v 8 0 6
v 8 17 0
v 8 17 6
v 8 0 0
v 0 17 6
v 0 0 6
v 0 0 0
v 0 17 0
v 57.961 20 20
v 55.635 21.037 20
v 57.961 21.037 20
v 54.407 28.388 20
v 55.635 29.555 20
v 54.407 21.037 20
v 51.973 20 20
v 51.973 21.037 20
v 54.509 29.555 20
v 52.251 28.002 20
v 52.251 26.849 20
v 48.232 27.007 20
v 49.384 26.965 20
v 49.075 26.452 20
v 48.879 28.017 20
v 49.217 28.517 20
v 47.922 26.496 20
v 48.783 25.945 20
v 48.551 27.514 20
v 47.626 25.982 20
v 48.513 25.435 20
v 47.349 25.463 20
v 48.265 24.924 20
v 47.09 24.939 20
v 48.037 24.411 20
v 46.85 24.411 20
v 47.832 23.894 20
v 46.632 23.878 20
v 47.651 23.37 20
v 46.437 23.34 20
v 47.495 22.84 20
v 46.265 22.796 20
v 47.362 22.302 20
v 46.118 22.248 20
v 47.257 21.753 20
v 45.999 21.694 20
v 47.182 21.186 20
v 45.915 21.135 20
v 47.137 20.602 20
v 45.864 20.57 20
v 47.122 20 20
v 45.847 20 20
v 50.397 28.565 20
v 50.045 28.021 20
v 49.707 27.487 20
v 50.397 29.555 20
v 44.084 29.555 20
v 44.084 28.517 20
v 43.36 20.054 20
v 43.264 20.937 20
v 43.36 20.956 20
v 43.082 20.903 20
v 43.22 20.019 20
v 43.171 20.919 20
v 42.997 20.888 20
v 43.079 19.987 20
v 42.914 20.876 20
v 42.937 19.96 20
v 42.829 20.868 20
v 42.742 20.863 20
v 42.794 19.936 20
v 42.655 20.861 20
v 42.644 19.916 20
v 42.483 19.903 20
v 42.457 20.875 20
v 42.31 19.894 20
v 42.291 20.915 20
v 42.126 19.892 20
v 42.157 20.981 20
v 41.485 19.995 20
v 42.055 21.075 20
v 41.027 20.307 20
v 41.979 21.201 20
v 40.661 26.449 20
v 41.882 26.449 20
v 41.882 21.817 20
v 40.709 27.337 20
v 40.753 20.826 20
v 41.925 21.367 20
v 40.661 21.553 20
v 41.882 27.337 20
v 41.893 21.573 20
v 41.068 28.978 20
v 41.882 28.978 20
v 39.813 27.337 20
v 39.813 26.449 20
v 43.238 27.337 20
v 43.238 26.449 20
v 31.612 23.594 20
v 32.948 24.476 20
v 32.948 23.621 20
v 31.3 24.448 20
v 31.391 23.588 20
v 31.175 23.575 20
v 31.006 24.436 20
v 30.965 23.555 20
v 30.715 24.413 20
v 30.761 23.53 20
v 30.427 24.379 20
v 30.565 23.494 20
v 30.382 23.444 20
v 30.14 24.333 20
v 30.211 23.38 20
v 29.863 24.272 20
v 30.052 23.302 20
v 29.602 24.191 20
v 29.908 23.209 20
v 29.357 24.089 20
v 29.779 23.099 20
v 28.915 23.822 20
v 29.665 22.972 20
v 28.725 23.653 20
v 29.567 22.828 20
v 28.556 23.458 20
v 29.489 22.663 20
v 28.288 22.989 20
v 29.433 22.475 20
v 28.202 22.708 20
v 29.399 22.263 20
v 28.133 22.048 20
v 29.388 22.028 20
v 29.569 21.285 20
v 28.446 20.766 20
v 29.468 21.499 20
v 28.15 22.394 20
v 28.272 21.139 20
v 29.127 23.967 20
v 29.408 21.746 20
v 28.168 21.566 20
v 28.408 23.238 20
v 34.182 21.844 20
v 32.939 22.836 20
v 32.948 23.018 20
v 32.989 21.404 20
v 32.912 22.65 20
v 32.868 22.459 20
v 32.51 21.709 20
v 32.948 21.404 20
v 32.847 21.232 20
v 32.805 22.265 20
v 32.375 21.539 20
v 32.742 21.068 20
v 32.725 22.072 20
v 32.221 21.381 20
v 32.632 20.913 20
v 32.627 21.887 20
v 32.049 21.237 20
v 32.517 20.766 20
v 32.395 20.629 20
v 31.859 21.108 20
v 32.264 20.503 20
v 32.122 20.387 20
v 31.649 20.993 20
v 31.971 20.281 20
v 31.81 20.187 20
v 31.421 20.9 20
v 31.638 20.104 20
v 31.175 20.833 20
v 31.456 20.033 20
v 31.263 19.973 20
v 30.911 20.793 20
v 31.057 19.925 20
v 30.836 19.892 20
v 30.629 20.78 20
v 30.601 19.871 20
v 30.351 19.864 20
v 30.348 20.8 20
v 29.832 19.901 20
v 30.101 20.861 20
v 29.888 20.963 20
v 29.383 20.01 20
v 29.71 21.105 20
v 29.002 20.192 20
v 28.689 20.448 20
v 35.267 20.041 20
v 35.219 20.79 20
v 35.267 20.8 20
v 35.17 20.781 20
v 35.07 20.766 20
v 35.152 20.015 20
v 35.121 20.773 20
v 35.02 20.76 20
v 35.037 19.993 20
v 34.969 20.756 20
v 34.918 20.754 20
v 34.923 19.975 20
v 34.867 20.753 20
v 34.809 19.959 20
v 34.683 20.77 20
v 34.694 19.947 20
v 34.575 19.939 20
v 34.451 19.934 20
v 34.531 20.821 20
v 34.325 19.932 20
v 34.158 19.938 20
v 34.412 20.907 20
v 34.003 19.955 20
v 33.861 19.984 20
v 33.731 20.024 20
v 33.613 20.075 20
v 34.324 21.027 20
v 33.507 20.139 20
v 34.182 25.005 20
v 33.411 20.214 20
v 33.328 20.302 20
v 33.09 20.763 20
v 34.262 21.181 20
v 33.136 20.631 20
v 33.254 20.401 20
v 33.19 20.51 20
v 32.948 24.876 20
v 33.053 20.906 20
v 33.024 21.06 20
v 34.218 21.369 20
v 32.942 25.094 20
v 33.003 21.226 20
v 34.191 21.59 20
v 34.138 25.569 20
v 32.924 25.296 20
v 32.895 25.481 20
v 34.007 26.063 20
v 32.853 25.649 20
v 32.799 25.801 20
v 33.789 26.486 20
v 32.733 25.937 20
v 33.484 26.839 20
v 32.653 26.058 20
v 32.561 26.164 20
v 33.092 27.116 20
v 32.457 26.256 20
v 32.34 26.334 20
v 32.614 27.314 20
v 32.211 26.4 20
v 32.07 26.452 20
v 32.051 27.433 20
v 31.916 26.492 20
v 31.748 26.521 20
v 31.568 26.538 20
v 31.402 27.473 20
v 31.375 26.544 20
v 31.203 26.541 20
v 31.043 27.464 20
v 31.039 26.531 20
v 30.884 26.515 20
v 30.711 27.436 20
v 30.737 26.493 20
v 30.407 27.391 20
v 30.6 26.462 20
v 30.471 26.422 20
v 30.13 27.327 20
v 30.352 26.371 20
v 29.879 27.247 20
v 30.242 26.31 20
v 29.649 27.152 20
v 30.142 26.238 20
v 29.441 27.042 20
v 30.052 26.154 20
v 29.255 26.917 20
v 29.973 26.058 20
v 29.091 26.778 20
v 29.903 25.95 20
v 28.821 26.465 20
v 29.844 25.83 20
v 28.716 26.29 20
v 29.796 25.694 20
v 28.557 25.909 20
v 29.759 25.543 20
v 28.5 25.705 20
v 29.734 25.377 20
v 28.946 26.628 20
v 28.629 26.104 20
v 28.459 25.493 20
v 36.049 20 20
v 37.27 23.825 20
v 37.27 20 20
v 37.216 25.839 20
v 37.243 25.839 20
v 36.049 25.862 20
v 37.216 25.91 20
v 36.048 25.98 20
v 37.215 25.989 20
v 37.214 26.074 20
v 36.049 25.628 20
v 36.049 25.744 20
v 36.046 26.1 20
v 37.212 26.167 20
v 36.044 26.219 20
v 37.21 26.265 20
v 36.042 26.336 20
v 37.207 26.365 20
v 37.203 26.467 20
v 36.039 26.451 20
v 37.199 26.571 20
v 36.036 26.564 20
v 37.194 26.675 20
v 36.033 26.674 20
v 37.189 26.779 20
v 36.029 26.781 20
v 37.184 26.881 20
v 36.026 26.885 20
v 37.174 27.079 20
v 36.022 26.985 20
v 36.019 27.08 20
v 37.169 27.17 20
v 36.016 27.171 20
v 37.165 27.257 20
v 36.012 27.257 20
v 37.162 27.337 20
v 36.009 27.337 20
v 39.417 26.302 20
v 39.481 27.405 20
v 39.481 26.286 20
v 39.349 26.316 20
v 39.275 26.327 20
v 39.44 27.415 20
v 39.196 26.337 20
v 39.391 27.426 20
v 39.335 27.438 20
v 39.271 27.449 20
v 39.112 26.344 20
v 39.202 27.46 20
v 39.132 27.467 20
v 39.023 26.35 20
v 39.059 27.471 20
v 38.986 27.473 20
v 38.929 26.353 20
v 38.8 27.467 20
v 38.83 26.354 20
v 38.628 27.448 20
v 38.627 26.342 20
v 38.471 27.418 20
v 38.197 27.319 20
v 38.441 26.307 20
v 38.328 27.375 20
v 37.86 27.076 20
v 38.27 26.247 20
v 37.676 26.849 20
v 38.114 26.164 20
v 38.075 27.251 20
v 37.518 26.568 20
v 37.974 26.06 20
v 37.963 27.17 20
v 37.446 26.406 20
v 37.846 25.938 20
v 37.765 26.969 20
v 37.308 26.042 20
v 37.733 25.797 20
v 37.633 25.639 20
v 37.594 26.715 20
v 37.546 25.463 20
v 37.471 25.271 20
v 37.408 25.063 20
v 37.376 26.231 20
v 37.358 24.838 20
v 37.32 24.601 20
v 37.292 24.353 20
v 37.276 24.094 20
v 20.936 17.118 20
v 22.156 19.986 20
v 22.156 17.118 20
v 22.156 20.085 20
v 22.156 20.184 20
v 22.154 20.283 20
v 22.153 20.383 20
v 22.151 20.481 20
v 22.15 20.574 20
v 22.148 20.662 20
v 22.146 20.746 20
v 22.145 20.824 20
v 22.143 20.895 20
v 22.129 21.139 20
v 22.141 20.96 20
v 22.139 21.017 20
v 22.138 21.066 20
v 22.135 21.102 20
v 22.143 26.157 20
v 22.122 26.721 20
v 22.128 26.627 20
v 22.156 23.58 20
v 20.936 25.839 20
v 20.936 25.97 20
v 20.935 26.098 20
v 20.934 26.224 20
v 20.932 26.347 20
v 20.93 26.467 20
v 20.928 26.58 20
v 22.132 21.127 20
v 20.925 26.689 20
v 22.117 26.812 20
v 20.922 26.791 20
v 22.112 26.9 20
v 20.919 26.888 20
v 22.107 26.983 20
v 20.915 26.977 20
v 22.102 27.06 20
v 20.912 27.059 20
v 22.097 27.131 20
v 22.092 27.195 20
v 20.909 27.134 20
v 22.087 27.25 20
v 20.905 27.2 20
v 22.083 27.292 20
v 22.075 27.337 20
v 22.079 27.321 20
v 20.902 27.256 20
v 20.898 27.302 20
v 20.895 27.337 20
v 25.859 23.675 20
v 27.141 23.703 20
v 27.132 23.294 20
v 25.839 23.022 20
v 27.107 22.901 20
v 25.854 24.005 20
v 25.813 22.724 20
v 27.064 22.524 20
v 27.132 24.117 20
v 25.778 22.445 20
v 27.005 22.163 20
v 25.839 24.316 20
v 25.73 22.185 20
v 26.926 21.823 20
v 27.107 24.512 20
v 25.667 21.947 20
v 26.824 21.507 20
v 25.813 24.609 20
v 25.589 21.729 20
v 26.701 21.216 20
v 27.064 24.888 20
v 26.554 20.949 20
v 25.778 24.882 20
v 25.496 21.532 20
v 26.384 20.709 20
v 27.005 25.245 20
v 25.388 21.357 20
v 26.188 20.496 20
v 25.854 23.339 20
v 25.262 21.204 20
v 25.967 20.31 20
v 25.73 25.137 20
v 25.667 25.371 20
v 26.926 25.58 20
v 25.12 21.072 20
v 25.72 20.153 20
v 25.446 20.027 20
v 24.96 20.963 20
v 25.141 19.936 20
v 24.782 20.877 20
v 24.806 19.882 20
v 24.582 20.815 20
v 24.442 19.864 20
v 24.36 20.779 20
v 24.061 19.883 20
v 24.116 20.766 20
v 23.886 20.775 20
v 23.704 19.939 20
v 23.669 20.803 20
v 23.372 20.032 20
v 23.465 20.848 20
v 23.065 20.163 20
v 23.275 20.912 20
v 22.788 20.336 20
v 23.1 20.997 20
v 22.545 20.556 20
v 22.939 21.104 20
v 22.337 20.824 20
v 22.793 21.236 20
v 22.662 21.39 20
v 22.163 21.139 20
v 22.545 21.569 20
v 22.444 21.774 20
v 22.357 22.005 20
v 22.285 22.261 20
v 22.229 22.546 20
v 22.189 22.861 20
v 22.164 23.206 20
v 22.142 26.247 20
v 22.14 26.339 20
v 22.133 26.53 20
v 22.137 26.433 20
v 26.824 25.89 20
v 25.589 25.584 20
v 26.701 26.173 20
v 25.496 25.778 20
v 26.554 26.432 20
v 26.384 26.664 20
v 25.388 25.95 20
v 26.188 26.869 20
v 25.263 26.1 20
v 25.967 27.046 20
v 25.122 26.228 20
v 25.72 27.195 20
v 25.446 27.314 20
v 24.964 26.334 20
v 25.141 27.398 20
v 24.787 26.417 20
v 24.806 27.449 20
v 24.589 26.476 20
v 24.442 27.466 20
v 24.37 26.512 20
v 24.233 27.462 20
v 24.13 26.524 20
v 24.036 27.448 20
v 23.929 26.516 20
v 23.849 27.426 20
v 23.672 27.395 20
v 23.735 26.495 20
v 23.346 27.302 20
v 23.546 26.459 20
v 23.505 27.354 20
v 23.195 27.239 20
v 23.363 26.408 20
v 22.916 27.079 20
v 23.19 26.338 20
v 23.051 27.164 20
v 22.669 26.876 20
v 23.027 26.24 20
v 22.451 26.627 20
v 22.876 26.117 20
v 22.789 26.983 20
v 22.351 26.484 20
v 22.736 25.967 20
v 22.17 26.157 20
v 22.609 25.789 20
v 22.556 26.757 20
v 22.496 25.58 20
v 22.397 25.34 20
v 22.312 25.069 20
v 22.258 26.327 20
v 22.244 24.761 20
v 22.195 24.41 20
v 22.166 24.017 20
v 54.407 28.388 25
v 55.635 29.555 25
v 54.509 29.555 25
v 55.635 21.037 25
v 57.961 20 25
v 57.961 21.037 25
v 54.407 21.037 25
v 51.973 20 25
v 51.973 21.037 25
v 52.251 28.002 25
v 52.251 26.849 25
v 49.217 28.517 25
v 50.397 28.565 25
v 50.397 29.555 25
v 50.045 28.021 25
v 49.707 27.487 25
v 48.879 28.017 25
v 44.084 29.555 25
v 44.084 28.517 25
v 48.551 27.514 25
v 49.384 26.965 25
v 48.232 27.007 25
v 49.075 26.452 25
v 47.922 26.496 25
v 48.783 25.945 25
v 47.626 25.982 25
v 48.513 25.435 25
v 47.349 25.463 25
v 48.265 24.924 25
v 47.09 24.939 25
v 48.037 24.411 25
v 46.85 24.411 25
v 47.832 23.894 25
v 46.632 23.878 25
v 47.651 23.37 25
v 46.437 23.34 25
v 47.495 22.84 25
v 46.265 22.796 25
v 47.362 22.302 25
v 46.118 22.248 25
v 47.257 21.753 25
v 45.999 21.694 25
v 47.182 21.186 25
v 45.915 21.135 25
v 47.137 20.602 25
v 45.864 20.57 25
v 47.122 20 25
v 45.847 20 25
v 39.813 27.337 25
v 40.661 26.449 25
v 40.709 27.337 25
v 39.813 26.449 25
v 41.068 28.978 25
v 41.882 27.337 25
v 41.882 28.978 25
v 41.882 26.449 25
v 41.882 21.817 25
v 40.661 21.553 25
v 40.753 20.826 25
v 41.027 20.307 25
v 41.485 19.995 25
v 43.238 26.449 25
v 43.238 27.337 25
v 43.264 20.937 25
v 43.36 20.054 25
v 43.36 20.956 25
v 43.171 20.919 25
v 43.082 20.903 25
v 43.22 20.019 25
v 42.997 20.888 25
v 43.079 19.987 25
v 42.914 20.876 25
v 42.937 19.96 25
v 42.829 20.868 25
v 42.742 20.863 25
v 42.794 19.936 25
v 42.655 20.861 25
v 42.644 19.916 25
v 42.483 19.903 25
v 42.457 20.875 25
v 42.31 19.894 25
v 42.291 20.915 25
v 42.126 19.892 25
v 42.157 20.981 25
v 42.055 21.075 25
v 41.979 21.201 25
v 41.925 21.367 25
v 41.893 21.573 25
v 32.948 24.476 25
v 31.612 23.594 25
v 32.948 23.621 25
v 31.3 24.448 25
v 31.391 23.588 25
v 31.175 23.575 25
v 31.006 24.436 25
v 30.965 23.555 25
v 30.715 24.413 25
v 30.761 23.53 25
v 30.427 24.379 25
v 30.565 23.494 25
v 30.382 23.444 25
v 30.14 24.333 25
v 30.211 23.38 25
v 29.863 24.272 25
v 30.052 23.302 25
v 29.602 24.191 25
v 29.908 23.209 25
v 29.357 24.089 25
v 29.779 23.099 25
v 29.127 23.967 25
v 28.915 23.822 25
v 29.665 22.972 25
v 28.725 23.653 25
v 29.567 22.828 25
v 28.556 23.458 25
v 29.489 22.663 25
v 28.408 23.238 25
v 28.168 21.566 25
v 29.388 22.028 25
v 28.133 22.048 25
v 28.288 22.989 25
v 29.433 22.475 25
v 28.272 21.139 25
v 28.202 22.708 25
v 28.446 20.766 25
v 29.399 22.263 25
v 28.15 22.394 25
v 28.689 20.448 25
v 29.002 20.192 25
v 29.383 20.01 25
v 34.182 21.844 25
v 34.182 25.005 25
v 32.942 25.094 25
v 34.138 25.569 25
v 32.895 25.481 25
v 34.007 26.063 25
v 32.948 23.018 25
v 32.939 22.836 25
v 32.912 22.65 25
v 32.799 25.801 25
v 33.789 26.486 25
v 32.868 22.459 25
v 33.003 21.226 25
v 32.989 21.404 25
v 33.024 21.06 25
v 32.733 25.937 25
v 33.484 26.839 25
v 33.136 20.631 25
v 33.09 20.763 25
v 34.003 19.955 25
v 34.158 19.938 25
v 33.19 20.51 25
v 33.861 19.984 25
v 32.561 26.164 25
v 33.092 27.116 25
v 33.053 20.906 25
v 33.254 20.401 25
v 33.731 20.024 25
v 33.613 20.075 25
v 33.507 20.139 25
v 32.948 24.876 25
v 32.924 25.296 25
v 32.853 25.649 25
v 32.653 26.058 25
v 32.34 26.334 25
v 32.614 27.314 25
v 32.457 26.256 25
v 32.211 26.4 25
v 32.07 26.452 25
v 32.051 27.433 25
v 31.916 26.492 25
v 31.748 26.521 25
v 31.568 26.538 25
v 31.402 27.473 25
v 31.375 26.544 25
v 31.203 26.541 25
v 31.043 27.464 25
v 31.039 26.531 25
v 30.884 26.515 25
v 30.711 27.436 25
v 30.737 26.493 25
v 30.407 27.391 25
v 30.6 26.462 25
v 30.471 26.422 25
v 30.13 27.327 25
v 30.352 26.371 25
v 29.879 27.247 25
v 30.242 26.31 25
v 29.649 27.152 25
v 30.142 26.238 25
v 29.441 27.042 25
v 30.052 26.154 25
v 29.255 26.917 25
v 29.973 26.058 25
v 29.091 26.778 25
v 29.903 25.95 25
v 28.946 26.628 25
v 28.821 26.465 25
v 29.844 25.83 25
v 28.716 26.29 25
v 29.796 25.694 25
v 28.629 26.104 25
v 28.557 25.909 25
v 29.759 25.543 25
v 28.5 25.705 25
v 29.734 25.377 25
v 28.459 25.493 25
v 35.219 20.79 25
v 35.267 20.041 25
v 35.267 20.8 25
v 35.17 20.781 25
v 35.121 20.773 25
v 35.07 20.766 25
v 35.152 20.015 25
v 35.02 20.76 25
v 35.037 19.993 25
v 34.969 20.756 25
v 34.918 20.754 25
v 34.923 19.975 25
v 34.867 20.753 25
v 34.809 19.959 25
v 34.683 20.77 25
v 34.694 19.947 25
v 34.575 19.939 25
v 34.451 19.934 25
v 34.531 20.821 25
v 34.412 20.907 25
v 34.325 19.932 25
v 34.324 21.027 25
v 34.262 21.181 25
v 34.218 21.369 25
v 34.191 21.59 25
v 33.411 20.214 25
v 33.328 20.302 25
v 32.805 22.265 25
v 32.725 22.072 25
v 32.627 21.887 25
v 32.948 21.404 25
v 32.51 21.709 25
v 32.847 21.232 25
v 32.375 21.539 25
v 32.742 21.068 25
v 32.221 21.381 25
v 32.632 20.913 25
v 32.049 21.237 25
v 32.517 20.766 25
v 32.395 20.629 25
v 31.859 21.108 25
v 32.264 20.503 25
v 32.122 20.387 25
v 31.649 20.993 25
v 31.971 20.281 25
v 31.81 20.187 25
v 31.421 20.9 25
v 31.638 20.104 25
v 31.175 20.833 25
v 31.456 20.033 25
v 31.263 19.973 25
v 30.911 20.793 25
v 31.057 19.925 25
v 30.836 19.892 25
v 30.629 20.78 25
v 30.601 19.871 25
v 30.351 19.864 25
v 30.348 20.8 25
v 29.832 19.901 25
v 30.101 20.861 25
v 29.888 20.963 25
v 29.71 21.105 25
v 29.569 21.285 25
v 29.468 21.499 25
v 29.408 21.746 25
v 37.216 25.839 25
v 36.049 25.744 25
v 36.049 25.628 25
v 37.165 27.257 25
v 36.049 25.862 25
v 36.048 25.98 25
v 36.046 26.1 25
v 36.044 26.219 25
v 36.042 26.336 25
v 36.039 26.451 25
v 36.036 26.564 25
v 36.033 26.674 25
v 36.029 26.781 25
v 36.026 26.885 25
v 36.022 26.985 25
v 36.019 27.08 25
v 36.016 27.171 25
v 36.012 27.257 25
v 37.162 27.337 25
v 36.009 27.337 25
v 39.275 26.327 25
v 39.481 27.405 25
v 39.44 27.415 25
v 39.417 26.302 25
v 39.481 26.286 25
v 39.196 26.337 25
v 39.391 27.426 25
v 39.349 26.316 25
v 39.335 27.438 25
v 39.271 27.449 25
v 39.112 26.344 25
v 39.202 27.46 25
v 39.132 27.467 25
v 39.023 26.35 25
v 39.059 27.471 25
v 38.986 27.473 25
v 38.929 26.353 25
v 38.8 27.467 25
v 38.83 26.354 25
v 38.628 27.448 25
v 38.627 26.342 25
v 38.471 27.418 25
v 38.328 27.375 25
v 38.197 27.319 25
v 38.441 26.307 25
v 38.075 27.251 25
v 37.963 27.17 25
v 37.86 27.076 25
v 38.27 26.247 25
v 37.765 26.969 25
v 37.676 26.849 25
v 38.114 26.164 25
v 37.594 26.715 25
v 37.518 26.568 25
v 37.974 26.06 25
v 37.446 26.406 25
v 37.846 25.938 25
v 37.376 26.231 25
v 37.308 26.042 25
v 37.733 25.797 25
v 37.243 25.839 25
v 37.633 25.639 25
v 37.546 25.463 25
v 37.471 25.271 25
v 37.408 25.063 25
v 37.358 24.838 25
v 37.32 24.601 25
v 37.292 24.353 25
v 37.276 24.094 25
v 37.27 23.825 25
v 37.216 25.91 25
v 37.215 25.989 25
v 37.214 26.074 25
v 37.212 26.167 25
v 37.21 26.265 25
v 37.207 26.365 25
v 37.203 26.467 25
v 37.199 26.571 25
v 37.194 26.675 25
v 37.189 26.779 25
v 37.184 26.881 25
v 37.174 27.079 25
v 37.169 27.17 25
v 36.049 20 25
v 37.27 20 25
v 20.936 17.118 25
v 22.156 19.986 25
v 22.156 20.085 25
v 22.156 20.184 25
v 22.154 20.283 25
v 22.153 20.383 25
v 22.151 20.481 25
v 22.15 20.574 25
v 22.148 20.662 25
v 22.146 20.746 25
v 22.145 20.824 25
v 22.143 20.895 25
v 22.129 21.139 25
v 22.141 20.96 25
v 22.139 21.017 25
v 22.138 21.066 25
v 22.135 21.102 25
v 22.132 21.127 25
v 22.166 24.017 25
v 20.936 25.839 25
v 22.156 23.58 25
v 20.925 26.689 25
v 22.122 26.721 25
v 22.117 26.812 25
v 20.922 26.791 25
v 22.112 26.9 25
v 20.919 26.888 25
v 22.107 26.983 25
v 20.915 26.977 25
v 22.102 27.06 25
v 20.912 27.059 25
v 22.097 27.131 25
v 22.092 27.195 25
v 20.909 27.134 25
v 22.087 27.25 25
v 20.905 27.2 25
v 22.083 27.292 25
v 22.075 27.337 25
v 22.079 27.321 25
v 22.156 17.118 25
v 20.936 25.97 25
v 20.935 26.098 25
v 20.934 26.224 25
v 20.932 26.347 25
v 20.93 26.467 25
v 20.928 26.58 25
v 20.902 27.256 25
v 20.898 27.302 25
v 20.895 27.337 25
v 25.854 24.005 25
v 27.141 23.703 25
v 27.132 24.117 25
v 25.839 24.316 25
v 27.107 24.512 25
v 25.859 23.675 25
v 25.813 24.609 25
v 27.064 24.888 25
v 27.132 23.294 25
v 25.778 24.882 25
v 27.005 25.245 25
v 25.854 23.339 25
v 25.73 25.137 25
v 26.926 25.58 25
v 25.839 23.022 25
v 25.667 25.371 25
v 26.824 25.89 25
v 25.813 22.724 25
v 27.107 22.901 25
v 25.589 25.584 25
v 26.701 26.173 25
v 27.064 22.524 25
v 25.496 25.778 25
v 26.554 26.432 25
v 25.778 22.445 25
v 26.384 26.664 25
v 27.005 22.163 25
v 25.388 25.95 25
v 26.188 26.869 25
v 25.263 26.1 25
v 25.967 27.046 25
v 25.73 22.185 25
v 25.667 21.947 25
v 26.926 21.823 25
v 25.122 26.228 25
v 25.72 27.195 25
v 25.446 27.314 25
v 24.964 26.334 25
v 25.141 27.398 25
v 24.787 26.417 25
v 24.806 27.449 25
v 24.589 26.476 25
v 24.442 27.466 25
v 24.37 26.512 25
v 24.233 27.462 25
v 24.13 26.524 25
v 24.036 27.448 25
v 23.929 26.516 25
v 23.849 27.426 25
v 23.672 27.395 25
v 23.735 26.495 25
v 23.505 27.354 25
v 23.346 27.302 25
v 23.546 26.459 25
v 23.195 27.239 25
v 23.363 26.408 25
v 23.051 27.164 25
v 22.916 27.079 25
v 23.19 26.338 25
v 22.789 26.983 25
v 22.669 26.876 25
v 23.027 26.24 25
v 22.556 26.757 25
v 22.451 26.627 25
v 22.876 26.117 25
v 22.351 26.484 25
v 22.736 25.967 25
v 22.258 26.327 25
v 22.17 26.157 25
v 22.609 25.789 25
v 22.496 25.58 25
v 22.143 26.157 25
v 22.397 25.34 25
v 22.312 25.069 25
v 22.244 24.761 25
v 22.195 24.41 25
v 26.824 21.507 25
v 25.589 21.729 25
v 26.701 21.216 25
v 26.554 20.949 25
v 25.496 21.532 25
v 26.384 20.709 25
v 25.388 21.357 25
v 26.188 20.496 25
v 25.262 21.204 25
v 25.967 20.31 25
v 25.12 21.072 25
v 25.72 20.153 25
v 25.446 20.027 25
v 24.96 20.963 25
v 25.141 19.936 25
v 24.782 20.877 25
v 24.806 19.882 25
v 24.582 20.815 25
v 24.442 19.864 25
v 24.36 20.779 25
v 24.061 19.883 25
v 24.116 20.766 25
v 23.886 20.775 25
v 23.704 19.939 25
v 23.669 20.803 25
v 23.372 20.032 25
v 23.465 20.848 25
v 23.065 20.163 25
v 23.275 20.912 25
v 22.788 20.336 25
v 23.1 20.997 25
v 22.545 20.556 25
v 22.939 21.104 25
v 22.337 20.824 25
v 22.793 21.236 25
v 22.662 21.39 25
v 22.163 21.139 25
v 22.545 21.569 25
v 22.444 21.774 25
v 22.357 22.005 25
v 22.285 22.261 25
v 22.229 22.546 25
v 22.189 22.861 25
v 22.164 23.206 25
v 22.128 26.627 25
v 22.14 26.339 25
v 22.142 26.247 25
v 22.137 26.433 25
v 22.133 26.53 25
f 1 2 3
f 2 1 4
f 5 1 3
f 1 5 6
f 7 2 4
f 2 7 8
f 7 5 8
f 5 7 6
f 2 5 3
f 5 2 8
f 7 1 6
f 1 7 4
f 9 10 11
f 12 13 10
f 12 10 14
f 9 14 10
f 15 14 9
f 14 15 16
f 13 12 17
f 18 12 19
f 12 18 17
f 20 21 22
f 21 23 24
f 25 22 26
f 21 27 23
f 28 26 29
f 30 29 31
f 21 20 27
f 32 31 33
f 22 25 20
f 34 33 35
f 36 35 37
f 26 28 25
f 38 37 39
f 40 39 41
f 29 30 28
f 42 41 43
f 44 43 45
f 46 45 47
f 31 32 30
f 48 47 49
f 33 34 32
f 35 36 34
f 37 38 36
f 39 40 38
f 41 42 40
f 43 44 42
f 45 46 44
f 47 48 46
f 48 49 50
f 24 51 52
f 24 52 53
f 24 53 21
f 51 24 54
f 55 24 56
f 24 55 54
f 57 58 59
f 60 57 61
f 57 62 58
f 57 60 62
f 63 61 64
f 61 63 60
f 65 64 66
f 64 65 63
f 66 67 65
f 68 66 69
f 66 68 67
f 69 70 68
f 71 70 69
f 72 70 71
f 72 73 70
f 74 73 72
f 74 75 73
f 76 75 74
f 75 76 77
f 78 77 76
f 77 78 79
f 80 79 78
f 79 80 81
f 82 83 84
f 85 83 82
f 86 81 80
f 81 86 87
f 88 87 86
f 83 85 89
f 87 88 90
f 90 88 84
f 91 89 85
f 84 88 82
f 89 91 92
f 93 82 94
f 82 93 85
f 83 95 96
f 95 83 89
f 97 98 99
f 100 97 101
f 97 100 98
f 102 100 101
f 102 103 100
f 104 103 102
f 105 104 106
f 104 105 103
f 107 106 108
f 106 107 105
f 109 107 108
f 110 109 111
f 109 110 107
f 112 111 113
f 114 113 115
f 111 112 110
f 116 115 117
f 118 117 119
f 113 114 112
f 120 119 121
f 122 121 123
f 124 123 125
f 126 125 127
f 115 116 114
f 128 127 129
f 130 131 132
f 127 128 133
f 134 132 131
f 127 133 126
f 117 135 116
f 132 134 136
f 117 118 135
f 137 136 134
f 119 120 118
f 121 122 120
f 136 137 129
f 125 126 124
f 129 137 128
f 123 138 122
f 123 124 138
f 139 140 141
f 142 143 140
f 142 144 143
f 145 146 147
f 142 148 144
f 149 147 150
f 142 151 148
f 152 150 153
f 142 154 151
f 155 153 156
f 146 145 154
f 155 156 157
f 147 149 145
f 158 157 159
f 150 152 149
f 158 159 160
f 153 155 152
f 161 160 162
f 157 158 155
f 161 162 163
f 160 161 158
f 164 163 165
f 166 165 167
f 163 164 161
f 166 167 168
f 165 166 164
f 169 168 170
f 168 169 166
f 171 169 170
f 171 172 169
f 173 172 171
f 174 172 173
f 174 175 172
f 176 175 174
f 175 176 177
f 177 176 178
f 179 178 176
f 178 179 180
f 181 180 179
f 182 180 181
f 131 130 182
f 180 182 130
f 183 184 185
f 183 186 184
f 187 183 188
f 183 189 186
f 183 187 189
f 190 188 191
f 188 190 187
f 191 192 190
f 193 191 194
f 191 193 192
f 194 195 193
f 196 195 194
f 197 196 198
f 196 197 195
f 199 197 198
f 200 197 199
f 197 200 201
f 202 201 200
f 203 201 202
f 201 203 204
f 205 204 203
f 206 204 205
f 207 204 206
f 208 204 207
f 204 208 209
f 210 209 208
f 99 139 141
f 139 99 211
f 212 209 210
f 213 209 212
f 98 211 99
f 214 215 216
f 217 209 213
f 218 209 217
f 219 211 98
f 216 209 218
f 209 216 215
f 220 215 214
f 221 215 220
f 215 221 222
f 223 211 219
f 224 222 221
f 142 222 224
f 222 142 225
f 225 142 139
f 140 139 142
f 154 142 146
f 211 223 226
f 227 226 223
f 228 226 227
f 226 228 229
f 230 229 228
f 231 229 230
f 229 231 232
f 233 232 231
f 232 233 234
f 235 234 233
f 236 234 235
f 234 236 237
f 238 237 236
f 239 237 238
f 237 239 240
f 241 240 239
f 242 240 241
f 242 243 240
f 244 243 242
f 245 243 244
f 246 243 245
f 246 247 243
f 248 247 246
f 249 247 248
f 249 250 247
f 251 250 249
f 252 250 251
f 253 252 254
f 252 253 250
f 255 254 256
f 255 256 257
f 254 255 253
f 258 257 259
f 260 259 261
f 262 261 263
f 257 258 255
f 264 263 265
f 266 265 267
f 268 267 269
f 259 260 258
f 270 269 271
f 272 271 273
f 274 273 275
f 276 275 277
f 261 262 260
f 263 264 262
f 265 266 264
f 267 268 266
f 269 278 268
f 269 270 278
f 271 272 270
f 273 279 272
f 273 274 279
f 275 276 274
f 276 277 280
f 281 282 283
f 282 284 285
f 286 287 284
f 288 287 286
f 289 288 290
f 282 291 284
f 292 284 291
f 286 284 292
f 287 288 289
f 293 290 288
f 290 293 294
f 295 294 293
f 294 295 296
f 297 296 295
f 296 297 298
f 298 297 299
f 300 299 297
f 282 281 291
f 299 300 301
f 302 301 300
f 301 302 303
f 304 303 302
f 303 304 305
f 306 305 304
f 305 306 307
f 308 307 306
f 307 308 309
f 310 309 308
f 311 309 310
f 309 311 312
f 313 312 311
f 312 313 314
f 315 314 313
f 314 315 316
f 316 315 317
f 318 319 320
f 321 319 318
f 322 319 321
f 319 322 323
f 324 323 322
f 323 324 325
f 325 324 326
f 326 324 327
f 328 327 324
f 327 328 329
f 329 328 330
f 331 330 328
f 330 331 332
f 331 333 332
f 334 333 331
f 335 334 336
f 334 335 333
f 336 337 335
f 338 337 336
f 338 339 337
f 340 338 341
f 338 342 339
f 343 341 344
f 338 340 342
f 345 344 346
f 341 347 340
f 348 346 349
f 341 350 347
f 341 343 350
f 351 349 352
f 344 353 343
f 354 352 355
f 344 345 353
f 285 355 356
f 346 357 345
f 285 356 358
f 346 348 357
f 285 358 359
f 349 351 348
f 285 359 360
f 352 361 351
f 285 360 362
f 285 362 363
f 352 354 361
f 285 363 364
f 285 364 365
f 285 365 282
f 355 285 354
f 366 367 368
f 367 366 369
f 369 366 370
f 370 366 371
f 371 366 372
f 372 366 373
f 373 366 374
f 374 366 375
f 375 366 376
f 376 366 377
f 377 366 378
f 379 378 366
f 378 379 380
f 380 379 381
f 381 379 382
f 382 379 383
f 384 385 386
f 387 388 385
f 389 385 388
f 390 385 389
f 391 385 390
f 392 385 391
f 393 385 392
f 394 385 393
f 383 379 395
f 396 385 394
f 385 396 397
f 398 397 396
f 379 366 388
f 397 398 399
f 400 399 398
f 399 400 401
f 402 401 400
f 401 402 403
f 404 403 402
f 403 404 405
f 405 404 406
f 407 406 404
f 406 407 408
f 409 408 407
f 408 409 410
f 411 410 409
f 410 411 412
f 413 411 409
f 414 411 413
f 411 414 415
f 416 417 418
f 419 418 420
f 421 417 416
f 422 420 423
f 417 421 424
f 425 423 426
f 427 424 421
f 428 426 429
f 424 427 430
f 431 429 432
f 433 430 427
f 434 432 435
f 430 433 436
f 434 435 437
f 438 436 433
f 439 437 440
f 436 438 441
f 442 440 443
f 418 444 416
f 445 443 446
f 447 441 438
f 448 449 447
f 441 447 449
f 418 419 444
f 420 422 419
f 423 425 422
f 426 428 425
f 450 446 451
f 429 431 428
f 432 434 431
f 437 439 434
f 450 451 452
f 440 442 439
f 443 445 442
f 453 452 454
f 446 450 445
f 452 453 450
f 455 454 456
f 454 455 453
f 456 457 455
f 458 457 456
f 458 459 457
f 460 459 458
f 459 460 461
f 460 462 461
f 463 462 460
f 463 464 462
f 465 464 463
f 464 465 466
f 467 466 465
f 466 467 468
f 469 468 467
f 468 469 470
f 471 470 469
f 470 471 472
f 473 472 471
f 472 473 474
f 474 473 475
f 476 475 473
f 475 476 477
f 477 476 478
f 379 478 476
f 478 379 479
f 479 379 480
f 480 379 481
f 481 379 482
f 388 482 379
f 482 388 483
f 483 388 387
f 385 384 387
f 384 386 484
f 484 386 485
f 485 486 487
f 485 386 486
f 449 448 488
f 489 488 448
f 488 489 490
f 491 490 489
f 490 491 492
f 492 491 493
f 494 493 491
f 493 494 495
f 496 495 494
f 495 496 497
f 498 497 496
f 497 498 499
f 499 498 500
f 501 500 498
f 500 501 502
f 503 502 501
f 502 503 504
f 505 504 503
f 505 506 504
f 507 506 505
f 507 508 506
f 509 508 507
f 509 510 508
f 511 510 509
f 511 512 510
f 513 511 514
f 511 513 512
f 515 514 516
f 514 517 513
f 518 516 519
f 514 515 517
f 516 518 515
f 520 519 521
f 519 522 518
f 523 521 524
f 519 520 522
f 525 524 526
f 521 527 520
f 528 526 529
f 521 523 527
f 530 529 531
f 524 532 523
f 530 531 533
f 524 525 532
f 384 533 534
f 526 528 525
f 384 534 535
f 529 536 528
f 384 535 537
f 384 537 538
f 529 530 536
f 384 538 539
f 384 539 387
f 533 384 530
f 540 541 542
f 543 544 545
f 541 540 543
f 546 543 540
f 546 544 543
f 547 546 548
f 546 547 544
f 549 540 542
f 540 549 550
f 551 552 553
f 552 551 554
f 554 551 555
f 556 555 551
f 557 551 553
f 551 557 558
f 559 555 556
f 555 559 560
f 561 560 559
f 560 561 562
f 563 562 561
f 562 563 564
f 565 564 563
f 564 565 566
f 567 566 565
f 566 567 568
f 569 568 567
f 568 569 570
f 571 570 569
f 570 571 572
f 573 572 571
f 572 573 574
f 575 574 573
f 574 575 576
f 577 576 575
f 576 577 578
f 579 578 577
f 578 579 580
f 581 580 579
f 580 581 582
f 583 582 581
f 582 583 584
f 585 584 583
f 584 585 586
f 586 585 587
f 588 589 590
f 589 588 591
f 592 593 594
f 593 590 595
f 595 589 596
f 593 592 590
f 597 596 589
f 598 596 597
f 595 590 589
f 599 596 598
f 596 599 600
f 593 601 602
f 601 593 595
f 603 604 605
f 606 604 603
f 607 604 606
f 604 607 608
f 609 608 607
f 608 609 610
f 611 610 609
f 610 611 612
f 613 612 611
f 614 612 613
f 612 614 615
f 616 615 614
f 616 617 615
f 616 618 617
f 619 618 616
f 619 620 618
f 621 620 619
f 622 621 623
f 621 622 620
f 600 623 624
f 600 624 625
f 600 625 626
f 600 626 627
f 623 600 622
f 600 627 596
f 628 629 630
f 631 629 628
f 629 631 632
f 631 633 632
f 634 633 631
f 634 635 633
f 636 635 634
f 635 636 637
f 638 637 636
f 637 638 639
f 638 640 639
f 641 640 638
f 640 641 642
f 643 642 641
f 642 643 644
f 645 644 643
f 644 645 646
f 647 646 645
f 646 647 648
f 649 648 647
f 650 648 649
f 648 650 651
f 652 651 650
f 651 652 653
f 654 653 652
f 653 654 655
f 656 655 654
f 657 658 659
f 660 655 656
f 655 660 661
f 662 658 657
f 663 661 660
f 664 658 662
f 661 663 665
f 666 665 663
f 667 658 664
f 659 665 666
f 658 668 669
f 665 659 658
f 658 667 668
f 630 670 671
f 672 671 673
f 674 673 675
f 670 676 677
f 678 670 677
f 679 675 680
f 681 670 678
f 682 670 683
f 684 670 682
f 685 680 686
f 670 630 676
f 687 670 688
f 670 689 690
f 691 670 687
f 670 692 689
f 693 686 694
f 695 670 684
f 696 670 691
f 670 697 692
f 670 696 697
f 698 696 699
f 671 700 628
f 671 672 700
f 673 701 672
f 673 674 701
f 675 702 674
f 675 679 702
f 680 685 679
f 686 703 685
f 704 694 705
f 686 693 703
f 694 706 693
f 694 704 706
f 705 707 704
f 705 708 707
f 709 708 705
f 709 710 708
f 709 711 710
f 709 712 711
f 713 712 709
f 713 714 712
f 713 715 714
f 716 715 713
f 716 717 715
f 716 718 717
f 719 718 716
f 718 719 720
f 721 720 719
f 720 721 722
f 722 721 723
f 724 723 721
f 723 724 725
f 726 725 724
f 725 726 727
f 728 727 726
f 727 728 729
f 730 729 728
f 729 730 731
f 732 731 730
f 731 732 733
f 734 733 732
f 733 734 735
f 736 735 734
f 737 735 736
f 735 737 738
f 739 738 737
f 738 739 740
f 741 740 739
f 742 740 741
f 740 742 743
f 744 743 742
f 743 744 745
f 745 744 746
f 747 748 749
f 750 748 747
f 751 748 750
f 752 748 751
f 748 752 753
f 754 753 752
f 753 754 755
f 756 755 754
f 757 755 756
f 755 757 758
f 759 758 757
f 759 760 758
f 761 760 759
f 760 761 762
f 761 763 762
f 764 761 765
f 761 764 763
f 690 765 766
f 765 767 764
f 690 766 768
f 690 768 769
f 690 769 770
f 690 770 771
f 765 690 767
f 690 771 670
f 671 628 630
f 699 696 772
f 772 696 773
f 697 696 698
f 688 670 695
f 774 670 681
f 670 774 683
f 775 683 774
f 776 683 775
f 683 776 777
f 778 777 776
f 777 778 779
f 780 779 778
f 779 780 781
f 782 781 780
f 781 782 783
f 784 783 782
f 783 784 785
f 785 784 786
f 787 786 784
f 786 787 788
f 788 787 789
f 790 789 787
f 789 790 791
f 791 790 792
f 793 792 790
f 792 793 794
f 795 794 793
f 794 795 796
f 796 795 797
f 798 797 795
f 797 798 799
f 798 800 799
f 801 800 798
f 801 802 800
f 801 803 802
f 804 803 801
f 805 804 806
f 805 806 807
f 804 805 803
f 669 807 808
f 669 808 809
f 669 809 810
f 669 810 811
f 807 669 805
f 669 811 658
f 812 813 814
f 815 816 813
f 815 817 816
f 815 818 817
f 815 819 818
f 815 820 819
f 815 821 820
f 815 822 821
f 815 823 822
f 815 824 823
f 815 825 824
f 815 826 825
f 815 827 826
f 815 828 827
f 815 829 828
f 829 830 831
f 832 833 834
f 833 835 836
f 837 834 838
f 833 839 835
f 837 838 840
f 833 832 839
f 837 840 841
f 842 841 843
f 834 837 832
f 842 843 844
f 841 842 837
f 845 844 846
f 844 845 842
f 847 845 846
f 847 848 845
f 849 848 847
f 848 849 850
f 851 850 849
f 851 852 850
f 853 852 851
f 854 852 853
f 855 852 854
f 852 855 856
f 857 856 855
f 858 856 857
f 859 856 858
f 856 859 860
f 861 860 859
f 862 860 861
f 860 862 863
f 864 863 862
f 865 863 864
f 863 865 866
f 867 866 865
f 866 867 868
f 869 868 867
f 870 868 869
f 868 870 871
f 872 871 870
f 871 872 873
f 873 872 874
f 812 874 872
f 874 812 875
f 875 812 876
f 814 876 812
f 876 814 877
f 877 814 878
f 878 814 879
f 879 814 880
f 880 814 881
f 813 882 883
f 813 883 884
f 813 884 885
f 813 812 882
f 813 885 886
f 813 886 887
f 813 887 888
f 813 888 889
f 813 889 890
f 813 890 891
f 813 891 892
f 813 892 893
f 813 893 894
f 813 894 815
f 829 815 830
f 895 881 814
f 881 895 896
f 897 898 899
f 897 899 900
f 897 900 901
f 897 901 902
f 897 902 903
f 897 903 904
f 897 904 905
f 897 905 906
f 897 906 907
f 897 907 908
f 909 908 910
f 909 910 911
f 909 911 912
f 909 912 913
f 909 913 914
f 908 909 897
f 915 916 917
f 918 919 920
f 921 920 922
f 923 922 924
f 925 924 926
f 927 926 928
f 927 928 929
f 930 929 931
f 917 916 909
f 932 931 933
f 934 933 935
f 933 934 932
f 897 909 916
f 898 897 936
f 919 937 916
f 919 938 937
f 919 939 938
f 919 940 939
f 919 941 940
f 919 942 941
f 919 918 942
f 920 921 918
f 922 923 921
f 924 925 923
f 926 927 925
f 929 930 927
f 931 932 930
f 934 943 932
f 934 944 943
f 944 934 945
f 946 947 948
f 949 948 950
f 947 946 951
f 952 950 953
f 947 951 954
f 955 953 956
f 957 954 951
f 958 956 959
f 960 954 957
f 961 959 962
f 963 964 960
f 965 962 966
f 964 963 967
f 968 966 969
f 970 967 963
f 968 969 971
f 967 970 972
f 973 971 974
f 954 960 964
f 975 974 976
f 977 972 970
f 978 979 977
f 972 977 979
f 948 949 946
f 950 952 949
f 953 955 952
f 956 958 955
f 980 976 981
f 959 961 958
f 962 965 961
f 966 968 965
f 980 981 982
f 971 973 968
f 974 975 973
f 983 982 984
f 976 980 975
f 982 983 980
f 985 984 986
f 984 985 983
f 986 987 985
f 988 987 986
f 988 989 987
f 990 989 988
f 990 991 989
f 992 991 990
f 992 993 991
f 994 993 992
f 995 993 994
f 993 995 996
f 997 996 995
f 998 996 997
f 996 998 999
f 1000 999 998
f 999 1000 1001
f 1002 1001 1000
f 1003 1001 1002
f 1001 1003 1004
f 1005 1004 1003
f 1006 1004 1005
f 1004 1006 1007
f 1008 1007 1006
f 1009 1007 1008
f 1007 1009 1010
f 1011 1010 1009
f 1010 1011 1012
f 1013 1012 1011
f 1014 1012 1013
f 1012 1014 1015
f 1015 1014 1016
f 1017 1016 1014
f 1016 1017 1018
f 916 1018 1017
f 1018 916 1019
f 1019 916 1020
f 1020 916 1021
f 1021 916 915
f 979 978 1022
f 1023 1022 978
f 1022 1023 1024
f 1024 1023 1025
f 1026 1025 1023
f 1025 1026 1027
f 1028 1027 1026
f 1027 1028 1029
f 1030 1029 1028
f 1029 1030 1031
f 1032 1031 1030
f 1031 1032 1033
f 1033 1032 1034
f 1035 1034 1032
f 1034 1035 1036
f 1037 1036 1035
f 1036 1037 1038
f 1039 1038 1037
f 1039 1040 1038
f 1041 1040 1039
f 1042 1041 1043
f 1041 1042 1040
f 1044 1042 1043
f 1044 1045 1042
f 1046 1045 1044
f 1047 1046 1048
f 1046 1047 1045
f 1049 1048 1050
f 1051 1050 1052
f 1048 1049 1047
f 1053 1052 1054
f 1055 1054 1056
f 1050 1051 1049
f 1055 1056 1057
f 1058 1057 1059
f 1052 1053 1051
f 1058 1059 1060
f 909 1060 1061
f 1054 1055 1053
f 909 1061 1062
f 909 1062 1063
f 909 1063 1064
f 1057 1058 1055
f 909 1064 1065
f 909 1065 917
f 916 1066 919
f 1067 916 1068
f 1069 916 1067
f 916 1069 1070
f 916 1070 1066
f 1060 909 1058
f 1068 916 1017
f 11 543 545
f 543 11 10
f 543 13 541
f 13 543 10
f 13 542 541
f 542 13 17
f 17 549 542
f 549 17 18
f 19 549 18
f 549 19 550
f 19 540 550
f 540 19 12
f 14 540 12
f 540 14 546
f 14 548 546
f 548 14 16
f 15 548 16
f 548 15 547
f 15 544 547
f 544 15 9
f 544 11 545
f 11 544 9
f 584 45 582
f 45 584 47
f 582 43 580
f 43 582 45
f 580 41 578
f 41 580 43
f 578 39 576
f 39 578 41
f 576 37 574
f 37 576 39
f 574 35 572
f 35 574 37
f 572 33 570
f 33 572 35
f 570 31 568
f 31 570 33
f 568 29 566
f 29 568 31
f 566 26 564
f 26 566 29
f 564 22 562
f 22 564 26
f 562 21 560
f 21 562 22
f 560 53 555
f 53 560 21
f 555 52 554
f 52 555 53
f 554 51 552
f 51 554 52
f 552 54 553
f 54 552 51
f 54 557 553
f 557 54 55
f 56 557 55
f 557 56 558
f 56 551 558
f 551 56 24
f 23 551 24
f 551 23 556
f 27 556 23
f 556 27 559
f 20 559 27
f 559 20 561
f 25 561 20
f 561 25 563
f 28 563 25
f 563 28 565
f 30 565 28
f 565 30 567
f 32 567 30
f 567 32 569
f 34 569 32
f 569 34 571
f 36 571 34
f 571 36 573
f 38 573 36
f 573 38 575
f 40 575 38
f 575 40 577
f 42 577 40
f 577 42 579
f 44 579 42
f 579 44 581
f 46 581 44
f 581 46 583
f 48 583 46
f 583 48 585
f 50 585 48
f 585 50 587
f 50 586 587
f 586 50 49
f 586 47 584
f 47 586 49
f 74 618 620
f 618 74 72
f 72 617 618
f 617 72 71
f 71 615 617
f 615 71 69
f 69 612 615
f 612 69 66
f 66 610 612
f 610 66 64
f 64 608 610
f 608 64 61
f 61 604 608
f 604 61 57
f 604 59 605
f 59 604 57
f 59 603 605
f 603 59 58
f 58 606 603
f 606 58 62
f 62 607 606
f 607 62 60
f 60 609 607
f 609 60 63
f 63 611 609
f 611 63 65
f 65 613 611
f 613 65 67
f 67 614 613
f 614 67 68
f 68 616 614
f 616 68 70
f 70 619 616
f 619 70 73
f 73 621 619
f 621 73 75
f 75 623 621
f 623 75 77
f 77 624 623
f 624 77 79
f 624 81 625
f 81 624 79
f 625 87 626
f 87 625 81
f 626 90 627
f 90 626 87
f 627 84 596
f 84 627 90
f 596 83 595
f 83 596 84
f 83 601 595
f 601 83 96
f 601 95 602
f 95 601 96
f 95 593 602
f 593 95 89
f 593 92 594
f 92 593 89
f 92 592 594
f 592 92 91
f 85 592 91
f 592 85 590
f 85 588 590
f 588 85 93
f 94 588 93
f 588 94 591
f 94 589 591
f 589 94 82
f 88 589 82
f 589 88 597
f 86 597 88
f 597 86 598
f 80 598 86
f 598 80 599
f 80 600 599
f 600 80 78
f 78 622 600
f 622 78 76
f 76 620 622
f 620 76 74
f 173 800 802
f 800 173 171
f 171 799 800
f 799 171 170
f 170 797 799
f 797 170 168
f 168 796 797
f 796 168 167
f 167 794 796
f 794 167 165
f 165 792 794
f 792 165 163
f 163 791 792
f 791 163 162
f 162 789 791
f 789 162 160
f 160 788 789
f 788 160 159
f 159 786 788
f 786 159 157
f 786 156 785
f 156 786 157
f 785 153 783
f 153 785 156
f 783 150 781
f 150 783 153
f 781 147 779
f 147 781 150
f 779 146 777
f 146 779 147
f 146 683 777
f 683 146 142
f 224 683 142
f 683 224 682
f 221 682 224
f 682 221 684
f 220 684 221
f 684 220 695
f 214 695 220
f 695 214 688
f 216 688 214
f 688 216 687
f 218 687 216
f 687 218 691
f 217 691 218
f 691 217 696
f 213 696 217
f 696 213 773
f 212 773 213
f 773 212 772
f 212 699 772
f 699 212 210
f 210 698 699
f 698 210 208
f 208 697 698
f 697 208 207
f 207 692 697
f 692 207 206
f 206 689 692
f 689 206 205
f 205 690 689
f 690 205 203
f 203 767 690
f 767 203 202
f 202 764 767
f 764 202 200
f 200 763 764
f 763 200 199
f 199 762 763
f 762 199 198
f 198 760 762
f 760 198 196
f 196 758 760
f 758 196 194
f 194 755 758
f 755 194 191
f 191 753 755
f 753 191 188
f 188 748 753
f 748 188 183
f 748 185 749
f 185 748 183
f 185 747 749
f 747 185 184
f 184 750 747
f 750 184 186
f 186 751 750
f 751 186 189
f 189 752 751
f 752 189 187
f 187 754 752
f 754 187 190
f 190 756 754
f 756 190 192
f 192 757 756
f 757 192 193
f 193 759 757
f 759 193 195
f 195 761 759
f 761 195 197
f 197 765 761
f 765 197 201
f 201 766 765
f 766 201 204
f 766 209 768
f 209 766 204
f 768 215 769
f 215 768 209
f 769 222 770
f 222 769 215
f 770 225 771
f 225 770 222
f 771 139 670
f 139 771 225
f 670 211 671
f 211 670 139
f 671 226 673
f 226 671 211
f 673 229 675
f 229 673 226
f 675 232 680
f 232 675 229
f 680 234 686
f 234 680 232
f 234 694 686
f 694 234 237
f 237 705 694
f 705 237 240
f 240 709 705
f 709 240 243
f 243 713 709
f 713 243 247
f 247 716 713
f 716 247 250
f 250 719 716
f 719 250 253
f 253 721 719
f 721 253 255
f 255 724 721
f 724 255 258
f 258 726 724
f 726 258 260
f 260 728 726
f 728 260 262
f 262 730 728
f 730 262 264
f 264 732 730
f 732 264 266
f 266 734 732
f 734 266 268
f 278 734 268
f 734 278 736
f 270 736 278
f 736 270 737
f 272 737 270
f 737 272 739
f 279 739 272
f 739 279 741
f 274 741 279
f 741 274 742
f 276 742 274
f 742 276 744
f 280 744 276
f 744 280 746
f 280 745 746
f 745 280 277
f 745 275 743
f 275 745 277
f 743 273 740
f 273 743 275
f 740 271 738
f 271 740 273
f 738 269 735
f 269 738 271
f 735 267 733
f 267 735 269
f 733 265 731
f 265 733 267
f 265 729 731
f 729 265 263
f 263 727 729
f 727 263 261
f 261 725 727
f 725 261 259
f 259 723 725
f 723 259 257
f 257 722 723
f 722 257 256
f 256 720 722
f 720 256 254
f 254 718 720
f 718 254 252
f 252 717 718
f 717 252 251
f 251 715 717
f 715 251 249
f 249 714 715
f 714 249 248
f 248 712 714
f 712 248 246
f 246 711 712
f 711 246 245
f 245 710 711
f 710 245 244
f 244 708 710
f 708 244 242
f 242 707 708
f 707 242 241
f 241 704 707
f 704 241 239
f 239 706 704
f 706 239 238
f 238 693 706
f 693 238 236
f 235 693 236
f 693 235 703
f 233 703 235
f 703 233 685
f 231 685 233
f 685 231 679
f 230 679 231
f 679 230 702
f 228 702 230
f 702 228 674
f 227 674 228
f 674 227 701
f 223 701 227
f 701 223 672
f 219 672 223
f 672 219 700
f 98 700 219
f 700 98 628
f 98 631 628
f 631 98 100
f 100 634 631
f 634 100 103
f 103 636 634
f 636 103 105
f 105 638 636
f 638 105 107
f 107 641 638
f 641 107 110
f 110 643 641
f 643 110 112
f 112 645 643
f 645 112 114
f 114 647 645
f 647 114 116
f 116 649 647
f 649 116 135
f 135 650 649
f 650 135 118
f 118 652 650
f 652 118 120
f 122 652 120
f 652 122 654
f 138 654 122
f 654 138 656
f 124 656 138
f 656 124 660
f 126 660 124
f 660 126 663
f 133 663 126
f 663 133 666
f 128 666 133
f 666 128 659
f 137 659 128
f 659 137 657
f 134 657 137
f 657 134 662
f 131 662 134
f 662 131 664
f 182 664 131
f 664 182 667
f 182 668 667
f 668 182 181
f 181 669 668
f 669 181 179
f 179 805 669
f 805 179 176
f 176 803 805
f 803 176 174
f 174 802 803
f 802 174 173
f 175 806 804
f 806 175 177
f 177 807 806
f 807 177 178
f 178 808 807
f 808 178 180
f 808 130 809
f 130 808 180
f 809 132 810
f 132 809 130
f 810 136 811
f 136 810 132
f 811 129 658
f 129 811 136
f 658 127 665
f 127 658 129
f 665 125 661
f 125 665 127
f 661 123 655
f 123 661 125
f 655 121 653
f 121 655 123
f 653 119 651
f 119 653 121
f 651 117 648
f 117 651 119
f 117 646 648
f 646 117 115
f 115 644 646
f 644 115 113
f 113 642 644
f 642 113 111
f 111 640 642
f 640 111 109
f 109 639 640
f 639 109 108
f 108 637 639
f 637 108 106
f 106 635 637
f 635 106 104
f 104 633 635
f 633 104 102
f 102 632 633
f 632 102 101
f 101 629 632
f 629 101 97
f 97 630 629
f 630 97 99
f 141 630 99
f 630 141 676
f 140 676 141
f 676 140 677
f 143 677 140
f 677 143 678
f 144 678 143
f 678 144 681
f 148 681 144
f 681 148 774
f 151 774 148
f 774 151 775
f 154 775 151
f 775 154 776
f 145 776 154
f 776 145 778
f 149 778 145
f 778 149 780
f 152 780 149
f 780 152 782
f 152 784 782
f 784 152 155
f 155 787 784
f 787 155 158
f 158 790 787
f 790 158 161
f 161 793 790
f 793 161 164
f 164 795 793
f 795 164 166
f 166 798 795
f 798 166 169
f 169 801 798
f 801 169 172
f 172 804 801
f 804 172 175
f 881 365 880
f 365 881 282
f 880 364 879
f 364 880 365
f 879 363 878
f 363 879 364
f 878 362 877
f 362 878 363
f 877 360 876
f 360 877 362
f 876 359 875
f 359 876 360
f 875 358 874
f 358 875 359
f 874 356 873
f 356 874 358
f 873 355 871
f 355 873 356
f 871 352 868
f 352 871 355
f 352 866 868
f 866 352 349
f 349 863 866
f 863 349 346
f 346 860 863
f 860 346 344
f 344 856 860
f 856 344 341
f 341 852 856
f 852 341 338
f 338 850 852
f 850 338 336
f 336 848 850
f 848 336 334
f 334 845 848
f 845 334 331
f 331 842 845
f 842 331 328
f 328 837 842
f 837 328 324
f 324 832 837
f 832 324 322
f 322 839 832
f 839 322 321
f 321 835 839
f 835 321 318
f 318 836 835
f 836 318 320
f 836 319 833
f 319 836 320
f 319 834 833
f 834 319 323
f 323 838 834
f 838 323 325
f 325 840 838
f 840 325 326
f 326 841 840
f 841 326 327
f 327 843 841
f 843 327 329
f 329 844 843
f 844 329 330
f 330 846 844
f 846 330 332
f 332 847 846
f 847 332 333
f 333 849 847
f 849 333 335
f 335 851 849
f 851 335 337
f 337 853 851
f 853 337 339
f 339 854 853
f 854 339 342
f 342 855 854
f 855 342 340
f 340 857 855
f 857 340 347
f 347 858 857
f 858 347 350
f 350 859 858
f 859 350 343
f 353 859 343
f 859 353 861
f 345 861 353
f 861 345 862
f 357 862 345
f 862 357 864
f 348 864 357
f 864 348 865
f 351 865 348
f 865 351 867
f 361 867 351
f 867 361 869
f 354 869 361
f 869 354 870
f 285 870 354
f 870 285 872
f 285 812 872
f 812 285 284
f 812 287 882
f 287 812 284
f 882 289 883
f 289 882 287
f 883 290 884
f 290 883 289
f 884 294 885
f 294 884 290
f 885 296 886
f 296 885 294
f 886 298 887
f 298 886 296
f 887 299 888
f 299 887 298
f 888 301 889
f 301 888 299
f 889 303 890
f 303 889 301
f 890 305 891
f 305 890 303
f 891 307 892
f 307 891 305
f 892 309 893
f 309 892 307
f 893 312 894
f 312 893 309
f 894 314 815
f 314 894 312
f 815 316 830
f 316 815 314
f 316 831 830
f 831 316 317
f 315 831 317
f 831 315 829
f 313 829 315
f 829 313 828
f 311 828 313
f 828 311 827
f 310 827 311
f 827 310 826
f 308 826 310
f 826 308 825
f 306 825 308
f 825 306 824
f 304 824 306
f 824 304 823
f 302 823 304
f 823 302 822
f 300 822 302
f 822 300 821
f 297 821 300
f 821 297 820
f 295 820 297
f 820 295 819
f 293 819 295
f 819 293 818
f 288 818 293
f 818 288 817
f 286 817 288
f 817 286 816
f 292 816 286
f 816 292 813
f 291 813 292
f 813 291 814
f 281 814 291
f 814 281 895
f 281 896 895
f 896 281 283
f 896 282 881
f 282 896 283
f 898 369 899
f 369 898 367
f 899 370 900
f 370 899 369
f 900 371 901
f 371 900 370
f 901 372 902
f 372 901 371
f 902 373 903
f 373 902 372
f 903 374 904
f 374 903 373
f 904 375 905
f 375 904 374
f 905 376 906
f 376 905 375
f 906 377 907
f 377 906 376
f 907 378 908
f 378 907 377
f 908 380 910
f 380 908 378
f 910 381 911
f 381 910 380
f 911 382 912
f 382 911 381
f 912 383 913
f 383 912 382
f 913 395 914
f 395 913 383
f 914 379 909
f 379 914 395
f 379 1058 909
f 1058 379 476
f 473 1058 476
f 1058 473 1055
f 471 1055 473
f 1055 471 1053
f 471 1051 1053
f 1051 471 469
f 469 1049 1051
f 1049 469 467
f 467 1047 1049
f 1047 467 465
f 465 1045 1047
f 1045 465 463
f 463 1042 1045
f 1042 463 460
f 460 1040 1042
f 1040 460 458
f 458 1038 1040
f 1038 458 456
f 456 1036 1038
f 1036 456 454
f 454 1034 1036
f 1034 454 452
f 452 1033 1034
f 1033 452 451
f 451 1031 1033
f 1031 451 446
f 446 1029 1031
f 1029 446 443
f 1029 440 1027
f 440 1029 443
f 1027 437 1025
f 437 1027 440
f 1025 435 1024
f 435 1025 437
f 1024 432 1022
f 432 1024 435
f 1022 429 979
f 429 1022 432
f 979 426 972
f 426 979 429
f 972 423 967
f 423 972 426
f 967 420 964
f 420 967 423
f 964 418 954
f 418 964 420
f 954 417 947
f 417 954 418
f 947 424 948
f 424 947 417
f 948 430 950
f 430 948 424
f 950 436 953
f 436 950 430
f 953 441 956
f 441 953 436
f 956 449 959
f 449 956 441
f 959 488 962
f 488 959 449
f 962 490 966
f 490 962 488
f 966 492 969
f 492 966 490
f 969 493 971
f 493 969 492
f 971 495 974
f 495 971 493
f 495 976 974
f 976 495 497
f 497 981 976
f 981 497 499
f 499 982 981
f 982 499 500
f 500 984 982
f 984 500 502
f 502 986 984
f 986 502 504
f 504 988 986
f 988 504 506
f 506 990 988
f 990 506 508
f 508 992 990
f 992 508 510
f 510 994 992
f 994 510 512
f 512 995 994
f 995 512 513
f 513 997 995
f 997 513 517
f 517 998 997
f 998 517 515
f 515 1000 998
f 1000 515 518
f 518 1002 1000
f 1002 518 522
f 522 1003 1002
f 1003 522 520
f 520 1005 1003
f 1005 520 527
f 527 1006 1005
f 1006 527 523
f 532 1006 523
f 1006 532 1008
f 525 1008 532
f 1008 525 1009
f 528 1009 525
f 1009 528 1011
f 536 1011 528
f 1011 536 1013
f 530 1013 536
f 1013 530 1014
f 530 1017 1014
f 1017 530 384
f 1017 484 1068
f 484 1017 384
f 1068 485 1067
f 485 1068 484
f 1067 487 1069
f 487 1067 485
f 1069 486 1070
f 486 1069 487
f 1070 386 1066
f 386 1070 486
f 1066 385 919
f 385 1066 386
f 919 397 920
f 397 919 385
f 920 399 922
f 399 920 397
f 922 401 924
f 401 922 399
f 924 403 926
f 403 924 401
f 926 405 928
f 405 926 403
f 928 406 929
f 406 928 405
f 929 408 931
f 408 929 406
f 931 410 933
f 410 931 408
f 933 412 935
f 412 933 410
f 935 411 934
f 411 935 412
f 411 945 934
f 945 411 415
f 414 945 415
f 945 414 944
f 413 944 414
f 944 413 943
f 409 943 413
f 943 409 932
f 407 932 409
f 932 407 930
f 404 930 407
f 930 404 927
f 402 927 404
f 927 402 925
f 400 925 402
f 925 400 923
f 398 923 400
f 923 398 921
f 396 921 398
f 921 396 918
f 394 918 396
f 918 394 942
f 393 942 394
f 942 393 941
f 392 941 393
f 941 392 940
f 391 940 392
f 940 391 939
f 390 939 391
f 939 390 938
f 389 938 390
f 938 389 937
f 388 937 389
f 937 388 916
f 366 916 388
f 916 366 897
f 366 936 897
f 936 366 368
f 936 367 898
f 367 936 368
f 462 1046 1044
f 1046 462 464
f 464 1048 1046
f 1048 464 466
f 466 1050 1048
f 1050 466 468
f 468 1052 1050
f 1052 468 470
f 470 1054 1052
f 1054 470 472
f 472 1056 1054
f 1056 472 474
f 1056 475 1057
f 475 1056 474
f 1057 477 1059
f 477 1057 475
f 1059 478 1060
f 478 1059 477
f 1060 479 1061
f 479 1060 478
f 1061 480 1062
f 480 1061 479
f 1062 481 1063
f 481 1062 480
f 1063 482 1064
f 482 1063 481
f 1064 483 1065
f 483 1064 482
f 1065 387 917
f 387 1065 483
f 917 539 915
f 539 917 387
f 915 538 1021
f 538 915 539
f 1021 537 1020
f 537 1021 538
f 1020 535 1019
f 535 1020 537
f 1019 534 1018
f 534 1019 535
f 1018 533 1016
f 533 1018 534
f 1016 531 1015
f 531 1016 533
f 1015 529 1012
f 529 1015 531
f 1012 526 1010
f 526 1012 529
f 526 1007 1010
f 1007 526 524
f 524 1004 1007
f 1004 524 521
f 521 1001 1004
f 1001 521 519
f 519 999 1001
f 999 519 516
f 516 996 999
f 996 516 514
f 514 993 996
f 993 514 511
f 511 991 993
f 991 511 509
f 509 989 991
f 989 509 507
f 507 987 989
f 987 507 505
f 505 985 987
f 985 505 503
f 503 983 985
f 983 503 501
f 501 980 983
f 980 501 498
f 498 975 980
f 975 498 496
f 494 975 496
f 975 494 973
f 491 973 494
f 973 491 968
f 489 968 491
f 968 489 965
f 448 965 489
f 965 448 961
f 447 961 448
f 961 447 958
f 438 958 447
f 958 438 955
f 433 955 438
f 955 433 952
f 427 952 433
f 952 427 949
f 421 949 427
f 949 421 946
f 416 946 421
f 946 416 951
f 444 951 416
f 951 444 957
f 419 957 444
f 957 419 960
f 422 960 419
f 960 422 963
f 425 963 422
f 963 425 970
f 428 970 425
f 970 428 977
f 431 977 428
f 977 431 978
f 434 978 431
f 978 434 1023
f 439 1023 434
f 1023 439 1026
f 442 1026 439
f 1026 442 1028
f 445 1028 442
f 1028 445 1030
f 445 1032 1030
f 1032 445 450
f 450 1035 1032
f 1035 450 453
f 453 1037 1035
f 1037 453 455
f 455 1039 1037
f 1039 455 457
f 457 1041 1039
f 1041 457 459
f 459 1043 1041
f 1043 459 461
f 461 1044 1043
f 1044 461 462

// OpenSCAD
//[CUSTOMIZATION]
// X Dimension
xdim=8;
// Y Dimension
ydim=17;
// Z Dimension
zdim=6;
// Message
txt="part71";
// I love it
boolvar=true;
module __END_CUSTOMIZATIONS () {}
cube([xdim,ydim,zdim]);
translate([20,20,20]) { linear_extrude(5) text(txt, font="Liberation Sans"); }
